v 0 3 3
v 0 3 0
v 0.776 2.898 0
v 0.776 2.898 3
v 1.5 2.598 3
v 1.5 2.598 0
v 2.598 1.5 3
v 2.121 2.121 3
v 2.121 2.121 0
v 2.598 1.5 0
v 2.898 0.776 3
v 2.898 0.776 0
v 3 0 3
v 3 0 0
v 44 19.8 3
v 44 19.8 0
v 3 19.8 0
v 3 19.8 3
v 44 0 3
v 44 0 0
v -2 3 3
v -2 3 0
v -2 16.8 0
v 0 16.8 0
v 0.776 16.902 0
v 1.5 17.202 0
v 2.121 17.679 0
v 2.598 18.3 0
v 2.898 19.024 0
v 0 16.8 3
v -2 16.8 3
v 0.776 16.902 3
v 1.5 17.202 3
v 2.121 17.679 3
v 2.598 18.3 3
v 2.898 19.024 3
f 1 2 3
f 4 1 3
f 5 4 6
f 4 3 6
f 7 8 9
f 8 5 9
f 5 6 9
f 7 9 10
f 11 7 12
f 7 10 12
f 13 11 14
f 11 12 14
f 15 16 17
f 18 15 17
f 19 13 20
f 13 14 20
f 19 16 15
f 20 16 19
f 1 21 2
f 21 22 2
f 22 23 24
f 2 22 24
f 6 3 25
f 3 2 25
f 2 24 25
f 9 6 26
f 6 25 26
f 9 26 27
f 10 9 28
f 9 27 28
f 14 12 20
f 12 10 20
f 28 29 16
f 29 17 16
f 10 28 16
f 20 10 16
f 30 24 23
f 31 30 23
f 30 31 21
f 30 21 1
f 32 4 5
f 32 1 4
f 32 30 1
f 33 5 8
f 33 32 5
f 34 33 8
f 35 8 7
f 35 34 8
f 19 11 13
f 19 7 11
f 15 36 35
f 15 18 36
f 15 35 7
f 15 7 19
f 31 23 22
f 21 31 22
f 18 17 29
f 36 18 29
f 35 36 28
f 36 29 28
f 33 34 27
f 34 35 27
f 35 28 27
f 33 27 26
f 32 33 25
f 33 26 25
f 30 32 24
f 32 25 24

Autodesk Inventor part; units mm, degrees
ref_plane "YZ Plane" through (0, 0, 0) normal (1, 0, 0) x (0, 1, 0)
ref_plane "XZ Plane" through (0, 0, 0) normal (0, 1, 0) x (-1, 0, 0)
ref_plane "XY Plane" through (0, 0, 0) normal (0, 0, 1) x (1, 0, 0)
sketch "Эскиз3" plane through (0, 0, 0) normal (0, 0, 1) x (1, 0, 0)
  line L0 (3, 0) -> (44, 0)
  line L1 (44, 19.8) -> (3, 19.8)
  arc A0 (0, 16.8) -> (3, 19.8) centre (0, 19.8) ccw
  arc A1 (3, 0) -> (0, 3) centre (0, 0) ccw
  line L2 (-9.5212, 9.95) -> (-2, 9.95) construction
  line L3 (0, 16.8) -> (-2, 16.8)
  line L4 (-2, 16.8) -> (-2, 3)
  line L5 (-2, 3) -> (0, 3)
  line L6 (44, 19.8) -> (44, 0)
  point P0 (36.5732, 9.95)
  dimension "d10" = 6
  dimension "d11" = 19.8
  dimension "d13" = 2
  dimension "d14" = 46
extrude "Выдавливание3" add sketch "Эскиз3" along normal blind 3
equation "\"d11\" = width_profile_tibea - 2 * tolerance_plazma"
equation "\"d6\" = thickness_steel"
equation "\"tolerance_plazma\" = 0.1"
equation "\"thickness_steel\" = 3"
equation "\"d_main_screw_holes\" = 6.1"
equation "\"thickness_profile_tibea\" = 3"
equation "\"hight_shaft_shift\" = 37"
equation "\"thickness_profile_femur\" = 3"
equation "\"width_shaft_shift\" = 35"
equation "\"width_flattened_surface\" = 12"
equation "\"width_profile_tibea\" = 20"
properties part number "tibea_reinforcement_steel" material "Сталь"
